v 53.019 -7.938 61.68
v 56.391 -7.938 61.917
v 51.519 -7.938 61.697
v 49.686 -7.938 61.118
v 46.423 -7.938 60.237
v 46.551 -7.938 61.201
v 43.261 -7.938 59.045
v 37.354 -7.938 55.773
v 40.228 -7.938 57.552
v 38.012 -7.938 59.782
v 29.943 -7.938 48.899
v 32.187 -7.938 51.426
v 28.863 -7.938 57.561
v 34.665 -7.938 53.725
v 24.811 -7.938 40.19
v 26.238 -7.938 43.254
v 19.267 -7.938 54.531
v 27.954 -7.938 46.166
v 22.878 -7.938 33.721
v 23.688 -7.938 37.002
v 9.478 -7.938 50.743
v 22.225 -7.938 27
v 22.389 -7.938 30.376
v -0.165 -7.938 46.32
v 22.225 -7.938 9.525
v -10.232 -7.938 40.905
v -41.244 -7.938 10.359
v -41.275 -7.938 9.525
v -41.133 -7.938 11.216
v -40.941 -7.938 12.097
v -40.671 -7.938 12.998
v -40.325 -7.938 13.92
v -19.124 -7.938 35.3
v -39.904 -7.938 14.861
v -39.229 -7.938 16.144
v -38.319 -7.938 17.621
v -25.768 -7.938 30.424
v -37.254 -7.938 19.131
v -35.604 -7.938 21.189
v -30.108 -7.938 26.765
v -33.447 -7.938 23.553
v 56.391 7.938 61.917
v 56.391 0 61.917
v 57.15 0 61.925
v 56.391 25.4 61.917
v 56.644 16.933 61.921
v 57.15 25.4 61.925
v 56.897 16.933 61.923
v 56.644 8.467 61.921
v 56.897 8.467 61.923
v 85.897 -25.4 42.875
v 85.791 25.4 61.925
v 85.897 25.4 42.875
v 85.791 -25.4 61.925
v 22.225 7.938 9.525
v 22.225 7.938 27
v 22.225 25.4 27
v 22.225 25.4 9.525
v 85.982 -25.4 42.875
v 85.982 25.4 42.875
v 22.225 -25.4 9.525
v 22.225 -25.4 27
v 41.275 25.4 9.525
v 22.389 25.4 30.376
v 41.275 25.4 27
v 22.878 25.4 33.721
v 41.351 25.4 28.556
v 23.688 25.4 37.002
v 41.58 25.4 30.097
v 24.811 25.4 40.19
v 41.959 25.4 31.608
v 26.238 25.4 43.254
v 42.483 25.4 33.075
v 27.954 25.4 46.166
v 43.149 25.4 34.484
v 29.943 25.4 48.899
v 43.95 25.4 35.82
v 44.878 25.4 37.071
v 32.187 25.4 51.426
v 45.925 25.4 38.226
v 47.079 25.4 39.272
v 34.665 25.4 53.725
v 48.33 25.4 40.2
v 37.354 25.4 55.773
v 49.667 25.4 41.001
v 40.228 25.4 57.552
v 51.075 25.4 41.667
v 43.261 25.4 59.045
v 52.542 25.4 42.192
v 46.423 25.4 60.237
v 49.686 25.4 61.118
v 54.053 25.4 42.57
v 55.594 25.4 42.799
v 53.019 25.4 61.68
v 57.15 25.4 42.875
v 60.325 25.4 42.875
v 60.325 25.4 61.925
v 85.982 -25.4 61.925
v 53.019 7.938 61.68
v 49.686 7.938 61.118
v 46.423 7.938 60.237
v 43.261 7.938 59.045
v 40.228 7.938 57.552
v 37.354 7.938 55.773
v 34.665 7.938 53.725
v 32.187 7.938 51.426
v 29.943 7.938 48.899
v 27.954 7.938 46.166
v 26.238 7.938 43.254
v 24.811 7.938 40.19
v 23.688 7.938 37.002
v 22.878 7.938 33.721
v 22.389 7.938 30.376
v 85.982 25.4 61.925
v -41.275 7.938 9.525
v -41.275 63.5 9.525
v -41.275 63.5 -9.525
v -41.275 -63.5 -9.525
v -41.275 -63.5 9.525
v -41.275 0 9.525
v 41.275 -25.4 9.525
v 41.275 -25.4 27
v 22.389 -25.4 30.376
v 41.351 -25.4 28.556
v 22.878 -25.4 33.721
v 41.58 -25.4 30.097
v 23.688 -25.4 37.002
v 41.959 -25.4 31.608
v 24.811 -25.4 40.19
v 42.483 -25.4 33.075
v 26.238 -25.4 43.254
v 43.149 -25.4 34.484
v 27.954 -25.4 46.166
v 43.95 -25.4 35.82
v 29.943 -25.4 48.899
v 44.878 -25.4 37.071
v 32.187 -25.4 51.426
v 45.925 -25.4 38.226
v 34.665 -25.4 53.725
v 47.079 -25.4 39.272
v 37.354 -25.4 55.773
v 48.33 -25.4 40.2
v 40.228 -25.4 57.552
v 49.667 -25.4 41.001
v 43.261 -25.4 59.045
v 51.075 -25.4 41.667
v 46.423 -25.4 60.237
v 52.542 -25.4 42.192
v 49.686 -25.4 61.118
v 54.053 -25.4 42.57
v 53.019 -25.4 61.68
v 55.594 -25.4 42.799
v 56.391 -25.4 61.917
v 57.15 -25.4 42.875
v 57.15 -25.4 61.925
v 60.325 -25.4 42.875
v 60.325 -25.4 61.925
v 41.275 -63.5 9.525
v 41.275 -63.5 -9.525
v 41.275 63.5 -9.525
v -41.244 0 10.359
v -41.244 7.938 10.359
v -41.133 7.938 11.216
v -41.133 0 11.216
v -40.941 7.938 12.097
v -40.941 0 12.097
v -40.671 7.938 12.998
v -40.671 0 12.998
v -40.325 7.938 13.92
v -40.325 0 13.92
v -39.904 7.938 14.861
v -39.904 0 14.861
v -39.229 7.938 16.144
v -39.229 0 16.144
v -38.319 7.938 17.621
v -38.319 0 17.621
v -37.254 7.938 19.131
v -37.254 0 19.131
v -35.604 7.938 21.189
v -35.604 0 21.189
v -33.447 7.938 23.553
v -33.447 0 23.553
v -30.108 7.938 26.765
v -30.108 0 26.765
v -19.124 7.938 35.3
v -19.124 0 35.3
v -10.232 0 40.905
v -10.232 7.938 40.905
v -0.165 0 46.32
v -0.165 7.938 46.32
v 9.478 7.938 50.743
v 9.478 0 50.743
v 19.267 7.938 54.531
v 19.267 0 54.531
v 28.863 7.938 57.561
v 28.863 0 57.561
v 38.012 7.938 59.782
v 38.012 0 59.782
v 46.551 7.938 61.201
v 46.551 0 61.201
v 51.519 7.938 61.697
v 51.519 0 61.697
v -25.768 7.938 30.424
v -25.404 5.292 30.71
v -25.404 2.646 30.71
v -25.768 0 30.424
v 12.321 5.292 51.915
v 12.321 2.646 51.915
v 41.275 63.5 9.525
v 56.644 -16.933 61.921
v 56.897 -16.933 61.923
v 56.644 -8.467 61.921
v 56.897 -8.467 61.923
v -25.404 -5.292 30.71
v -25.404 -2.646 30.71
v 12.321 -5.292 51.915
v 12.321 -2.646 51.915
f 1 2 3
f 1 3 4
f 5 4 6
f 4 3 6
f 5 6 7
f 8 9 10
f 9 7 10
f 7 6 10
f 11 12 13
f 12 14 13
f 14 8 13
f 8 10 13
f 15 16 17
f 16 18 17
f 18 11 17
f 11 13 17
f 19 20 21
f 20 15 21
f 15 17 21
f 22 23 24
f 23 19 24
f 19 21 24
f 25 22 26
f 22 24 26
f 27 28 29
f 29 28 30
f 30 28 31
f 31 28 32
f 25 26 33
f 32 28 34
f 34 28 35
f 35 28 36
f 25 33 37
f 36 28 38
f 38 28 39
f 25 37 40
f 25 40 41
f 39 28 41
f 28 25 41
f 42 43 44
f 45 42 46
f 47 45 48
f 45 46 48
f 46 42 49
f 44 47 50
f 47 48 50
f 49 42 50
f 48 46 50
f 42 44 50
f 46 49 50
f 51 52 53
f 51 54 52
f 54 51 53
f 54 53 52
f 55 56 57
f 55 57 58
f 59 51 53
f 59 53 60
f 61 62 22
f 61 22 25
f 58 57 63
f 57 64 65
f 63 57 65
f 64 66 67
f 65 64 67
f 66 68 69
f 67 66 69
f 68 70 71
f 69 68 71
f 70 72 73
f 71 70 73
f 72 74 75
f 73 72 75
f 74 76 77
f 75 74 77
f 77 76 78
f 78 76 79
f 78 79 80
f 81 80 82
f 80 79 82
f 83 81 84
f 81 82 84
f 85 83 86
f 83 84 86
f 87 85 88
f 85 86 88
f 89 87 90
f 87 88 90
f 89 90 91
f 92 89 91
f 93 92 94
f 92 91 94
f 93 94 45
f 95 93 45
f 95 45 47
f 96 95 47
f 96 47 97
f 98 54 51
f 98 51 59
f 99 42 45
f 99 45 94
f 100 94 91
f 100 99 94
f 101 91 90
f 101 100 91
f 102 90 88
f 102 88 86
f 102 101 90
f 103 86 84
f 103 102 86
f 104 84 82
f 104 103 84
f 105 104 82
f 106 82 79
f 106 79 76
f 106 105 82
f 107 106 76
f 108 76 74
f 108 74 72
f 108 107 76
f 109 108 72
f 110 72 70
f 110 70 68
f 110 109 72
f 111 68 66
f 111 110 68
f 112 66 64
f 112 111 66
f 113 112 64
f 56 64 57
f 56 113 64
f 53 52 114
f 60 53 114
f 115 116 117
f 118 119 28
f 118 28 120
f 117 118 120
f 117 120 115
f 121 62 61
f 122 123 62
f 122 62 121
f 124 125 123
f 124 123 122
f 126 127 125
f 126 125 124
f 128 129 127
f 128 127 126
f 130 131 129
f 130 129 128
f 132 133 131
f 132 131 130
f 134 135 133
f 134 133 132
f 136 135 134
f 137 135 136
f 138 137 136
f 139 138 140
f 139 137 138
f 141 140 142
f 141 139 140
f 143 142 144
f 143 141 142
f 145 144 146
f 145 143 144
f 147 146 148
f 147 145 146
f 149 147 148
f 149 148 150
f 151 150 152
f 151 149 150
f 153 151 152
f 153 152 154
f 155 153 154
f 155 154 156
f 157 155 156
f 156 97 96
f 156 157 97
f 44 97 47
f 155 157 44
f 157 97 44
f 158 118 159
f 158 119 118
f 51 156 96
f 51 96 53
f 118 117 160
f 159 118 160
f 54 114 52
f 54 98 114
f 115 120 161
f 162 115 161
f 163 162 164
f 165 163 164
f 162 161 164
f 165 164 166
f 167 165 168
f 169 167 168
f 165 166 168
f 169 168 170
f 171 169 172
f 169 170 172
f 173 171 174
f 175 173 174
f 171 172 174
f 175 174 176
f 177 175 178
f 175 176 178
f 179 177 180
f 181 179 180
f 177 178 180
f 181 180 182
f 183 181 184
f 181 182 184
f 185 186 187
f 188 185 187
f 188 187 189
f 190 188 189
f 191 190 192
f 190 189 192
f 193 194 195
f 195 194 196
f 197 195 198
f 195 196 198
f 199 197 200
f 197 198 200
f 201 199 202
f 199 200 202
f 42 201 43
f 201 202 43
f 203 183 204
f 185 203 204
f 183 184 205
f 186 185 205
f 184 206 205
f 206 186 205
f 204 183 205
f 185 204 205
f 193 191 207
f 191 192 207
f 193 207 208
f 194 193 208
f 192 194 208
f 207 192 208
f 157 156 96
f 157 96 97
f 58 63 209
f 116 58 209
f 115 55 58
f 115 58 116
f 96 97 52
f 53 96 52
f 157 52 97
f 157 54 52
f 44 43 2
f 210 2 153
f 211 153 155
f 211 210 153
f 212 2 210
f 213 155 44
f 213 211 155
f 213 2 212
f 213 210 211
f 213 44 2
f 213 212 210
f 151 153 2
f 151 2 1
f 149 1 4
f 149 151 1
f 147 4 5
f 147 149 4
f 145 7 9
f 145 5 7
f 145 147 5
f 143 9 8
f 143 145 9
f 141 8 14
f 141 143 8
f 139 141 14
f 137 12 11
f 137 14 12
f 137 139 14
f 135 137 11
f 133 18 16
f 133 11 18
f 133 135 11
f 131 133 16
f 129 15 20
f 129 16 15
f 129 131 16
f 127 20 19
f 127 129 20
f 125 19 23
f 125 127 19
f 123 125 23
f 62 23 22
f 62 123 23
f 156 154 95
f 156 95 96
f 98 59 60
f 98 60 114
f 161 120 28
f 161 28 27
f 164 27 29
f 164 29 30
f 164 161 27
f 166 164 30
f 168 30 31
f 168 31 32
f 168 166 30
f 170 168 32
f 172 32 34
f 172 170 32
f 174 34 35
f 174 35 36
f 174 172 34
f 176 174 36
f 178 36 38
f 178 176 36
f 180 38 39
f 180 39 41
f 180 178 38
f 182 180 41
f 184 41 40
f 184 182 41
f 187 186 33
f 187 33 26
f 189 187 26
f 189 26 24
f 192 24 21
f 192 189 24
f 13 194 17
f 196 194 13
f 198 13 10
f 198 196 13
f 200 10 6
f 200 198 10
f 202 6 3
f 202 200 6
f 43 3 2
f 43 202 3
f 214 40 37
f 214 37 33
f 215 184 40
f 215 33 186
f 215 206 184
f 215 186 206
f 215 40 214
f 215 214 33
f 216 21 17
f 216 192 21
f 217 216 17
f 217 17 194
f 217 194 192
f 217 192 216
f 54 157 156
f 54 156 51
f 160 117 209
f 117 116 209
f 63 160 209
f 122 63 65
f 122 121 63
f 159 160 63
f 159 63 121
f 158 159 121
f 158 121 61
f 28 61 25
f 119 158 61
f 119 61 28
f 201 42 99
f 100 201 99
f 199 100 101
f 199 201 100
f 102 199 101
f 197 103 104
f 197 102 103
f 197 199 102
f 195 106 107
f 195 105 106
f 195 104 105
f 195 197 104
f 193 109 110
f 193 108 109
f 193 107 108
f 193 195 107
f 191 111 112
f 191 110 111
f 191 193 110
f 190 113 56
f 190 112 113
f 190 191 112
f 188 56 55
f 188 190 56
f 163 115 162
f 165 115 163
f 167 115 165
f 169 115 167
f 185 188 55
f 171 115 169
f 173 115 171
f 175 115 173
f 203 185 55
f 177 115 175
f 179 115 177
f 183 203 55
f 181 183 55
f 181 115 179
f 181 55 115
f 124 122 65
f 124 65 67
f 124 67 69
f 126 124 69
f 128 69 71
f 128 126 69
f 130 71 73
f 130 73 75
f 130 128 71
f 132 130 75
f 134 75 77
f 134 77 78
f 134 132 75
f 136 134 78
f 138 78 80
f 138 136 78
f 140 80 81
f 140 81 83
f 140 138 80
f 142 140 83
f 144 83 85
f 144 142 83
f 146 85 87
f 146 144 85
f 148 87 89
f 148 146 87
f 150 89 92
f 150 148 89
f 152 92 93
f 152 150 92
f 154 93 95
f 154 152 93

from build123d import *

# Parameters (mm, degrees)
F1_DEPTH = 63.5
F2_DEPTH = 25.4
F3_DEPTH = 7.9375
F4_DEPTH = 25.4


# Not quite as in the source:
# - a feature of the source that left no trace in its solid (it failed there, or was rolled back) is left out


with BuildPart() as f1:
    # F0 (on Front) → F1 (new body, symmetric)
    with BuildSketch(Plane.XZ):
        Polygon((-41.275, -9.525), (41.275, -9.525), (41.275, 9.525), (22.225, 9.525), (-41.275, 9.525), align=None)
    extrude(amount=F1_DEPTH, both=True)

    # F0 (on Front) → F2 (join, symmetric)
    with BuildSketch(Plane.XZ):
        with BuildLine():
            Line((22.225, 9.525), (41.275, 9.525))
            Line((41.275, 9.525), (41.275, 27.0002))
            ThreePointArc((41.275, 27.0002), (45.9246798487, 38.2255201513), (57.15, 42.8752))
            Line((57.15, 42.8752), (60.325, 42.8752))
            Line((60.325, 42.8752), (60.325, 61.9252))
            Line((60.325, 61.9252), (57.15, 61.9252))
            add(Edge.make_bspline(
                [(56.3910941137, 61.9169536701), (56.6445667291, 61.920927039), (56.8975404447, 61.9236794966), (57.15, 61.9252)],
                knots=[110.8367961001, 110.8367961001, 110.8367961001, 110.8367961001, 111.5045361635, 111.5045361635, 111.5045361635, 111.5045361635], degree=3))
            ThreePointArc((56.3910941137, 61.9169536701), (32.1874238801, 51.4261169421), (22.225, 27.0002))
            Line((22.225, 27.0002), (22.225, 9.525))
        make_face()
    extrude(amount=F2_DEPTH, both=True)

    # F0 (on Front) → F3 (join, symmetric)
    with BuildSketch(Plane.XZ):
        with BuildLine():
            add(Edge.make_bspline(
                [(-41.275, 9.525), (-41.5013838276, 26.9593473463), (14.3176973965, 61.2574223543), (56.3910941137, 61.9169536701)],
                knots=[0, 0, 0, 0, 110.8367961001, 110.8367961001, 110.8367961001, 110.8367961001], degree=3))
            Line((-41.275, 9.525), (22.225, 9.525))
            Line((22.225, 9.525), (22.225, 27.0002))
            ThreePointArc((22.225, 27.0002), (32.1874238801, 51.4261169421), (56.3910941137, 61.9169536701))
        make_face()
    extrude(amount=F3_DEPTH, both=True)


with BuildPart() as f2:
    # F0 (on Front) → F2, piece 2 (new body, symmetric)
    with BuildSketch(Plane.XZ):
        Polygon((85.7910350956, 61.9252), (85.8969844585, 42.8752), (85.9816285353, 42.8752), (85.9816285353, 61.9252), align=None)
    extrude(amount=F2_DEPTH, both=True)


with BuildPart() as f4:
    # F0 (on Front) → F4 (new body, symmetric)
    with BuildSketch(Plane.XZ):
        Polygon((60.325, 61.9252), (60.325, 42.8752), (85.8969844585, 42.8752), (85.7910350956, 61.9252), align=None)
    extrude(amount=F4_DEPTH, both=True)


solid = Compound([f1.part, f2.part, f4.part])
